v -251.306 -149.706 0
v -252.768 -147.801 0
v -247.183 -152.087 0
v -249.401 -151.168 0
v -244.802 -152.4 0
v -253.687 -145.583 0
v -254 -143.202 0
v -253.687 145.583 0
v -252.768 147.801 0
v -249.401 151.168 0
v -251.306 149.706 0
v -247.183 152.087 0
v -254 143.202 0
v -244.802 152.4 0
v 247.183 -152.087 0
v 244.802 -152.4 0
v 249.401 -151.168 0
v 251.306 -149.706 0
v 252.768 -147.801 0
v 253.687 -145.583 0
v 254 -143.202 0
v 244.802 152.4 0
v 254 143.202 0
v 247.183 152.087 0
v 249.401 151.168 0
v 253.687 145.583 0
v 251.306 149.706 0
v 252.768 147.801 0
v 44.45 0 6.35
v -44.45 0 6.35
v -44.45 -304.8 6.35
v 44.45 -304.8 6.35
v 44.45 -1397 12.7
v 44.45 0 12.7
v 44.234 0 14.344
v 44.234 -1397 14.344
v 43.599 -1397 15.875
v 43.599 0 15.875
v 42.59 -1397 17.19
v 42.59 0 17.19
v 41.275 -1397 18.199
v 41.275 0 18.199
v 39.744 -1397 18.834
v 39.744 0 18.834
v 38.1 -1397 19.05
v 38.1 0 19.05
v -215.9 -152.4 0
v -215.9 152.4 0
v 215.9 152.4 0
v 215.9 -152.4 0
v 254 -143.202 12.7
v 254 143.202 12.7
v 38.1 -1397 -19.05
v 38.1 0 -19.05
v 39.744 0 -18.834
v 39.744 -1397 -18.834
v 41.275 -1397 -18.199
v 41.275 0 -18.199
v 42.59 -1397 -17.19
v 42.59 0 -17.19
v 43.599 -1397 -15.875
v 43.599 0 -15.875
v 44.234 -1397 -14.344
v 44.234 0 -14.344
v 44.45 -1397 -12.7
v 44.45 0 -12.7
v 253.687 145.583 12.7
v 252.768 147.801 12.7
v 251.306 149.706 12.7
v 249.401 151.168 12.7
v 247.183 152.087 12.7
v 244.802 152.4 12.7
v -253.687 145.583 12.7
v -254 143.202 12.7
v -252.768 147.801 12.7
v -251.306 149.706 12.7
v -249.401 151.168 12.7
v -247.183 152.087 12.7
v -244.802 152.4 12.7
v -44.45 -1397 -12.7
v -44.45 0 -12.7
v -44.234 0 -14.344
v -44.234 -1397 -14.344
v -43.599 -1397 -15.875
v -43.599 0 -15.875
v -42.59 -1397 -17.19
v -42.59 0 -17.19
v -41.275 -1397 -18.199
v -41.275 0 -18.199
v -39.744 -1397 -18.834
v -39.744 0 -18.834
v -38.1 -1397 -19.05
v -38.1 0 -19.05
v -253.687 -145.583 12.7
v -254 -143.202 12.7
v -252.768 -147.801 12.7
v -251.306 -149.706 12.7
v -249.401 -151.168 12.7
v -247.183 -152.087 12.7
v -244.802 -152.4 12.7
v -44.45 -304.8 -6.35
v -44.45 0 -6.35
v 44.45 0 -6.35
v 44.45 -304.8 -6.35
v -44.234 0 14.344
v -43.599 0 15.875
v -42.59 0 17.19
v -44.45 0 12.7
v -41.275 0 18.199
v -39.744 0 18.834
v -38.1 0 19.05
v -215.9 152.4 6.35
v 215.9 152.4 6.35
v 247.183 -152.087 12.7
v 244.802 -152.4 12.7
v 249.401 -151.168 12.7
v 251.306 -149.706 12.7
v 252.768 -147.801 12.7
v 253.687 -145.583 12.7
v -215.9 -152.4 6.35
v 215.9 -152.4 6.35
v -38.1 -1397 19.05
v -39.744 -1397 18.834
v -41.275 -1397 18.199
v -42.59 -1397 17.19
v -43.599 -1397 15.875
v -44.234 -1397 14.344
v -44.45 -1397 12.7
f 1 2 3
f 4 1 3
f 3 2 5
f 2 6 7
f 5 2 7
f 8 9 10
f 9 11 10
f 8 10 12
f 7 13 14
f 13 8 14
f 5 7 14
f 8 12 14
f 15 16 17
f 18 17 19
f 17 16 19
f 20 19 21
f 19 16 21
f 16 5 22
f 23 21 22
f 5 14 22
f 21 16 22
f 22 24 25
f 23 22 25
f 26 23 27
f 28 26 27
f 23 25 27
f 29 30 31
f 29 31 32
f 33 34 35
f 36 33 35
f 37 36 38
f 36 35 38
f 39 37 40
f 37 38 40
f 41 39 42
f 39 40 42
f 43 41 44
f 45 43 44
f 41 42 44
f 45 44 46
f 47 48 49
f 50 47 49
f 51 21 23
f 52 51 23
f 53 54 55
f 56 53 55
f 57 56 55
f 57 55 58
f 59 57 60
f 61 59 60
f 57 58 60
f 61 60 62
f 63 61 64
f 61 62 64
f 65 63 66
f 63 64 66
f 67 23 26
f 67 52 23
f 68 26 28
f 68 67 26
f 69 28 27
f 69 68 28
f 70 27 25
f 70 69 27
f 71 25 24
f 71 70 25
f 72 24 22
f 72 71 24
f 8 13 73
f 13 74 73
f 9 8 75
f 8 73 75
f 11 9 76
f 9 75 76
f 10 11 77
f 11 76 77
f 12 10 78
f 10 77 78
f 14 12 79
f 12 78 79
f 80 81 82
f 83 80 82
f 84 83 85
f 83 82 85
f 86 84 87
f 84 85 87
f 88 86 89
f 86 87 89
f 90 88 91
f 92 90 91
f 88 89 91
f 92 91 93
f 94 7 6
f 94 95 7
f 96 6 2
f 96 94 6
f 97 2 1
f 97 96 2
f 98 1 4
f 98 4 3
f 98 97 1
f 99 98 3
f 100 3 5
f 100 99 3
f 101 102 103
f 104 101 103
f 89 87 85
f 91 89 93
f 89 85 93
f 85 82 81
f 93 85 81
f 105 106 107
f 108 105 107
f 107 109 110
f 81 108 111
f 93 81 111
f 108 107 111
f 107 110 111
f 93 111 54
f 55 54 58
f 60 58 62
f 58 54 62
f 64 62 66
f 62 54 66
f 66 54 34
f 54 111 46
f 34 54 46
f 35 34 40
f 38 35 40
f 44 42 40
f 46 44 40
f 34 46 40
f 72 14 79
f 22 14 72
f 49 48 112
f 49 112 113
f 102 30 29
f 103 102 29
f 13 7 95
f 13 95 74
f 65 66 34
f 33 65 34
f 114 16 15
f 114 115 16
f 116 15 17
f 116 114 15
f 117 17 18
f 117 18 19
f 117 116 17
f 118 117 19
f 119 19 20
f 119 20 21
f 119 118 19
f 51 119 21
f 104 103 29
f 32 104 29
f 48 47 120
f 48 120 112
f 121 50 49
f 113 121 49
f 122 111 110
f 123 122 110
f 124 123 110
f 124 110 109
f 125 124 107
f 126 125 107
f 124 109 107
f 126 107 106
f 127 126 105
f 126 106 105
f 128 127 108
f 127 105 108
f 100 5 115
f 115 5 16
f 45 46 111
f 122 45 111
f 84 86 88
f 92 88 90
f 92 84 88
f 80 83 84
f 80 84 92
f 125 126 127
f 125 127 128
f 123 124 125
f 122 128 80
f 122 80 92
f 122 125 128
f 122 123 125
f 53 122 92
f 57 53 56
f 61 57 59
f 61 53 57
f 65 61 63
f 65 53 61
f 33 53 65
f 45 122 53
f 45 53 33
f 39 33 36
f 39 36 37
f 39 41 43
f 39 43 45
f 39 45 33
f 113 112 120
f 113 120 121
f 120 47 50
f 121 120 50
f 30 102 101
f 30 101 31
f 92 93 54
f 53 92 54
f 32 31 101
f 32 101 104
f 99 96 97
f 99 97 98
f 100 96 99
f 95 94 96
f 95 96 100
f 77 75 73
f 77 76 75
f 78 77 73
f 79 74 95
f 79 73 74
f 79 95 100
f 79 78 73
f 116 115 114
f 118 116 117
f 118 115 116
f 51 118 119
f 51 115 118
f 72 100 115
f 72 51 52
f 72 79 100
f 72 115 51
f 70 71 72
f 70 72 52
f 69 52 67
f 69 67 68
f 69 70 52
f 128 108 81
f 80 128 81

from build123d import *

# Parameters (mm, degrees)
F2_DEPTH = 1397
F0_W     = 88.9
F0_H     = 12.7
F3_DEPTH = 304.8
F4_W     = 508
F4_H     = 304.8
F5_DEPTH = 12.7
F6_W     = 431.8
F6_H     = 304.8
F7_DEPTH = 6.35
F8_R     = 9.198154


with BuildPart() as f2:
    # F1 (on Front) → F2 (new body)
    with BuildSketch(Plane.XZ):
        with BuildLine():
            Line((-38.1, -19.05), (38.1, -19.05))
            ThreePointArc((38.1, -19.05), (42.590128, -17.190128), (44.45, -12.7))
            Line((44.45, -12.7), (44.45, 12.7))
            ThreePointArc((44.45, 12.7), (42.590128, 17.190128), (38.1, 19.05))
            Line((38.1, 19.05), (-38.1, 19.05))
            ThreePointArc((-38.1, 19.05), (-42.590128, 17.190128), (-44.45, 12.7))
            Line((-44.45, 12.7), (-44.45, -12.7))
            ThreePointArc((-44.45, -12.7), (-42.590128, -17.190128), (-38.1, -19.05))
        make_face()
    extrude(amount=F2_DEPTH)


with BuildPart() as f3:
    # F0 (on Front) → F3 (new body)
    with BuildSketch(Plane.XZ):
        Rectangle(F0_W, F0_H)
    extrude(amount=F3_DEPTH)


with BuildPart() as f5:
    # F4 (on Top) → F5 (new body)
    with BuildSketch(Plane.XY):
        Rectangle(F4_W, F4_H)
    extrude(amount=F5_DEPTH)

    # F8
    f8_edges = [f5.edges().sort_by_distance(p)[0] for p in [
        (254, -152.4, 6.35),
        (254, 152.4, 6.35),
        (-254, -152.4, 6.35),
        (-254, 152.4, 6.35),
    ]]
    fillet(f8_edges, radius=F8_R)


with BuildPart() as f7:
    # F6 (on Top) → F7 (new body)
    with BuildSketch(Plane.XY):
        Rectangle(F6_W, F6_H)
    extrude(amount=F7_DEPTH)


solid = Compound([f2.part, f3.part, f5.part, f7.part])
